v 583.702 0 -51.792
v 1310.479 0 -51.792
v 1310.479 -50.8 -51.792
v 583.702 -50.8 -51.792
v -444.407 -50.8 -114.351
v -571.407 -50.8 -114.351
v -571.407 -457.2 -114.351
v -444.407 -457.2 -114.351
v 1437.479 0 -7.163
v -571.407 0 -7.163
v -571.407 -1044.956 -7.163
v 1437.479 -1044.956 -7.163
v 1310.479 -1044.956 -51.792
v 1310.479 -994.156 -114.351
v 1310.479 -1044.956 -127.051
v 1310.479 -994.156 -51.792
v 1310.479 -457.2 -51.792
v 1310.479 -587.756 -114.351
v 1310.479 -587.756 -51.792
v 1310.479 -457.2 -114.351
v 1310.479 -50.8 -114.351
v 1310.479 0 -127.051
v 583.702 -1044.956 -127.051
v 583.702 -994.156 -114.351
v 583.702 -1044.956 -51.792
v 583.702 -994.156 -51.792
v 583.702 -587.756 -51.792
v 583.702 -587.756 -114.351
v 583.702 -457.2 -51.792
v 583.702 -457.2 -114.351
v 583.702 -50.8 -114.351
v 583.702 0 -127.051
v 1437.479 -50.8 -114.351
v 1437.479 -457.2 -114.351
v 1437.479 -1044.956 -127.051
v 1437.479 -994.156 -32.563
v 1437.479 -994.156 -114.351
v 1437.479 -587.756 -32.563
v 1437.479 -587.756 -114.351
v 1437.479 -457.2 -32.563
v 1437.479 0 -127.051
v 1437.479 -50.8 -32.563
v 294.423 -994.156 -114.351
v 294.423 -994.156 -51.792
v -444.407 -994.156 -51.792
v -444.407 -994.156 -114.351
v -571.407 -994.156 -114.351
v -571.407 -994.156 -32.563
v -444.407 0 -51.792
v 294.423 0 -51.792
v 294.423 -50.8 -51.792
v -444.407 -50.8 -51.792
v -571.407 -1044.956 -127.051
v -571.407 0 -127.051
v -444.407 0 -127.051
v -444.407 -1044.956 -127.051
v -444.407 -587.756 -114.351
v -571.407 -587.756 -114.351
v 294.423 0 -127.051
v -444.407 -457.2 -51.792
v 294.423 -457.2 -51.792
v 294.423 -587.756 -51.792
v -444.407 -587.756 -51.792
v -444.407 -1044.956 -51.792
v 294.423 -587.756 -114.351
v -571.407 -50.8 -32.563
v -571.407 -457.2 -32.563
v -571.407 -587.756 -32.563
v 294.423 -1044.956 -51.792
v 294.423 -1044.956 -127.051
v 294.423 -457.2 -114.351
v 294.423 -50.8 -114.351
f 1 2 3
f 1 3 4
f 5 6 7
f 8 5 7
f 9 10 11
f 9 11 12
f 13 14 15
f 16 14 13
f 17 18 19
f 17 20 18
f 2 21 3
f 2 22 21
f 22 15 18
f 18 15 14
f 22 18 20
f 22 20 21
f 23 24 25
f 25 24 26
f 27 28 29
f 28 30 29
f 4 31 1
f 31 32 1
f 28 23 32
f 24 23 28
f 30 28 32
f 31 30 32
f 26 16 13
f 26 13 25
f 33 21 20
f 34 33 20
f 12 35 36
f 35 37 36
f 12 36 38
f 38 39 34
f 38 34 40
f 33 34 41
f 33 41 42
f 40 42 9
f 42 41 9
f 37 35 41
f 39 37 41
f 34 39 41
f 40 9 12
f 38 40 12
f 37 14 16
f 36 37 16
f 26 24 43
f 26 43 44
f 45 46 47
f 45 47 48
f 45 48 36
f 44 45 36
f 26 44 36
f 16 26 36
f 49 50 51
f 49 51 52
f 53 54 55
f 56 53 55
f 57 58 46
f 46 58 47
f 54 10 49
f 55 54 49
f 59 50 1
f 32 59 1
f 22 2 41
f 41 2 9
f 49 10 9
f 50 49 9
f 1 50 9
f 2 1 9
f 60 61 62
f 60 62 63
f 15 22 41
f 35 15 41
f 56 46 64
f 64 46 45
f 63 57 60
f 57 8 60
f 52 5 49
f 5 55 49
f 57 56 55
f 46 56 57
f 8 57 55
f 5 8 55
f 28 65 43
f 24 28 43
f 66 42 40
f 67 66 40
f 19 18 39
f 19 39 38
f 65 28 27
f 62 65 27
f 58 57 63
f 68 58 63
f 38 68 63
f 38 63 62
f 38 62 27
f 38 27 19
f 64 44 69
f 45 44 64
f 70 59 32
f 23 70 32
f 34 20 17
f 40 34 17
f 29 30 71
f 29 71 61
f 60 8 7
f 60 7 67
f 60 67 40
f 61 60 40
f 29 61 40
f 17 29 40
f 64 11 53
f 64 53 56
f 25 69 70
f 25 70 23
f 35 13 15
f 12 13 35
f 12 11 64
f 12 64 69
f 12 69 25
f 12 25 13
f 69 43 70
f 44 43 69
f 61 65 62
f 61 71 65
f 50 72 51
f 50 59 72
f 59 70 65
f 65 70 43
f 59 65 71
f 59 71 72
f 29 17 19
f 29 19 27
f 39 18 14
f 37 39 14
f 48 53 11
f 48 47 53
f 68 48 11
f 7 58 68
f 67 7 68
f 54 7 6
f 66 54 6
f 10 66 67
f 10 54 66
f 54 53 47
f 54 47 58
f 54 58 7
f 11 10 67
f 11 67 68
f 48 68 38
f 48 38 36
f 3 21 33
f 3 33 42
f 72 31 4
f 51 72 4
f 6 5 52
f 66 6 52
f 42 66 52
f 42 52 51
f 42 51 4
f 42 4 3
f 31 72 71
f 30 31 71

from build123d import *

# Parameters (mm, degrees)
F0_W     = 2008.886
F0_H     = 119.888
F1_DEPTH = 1044.956
F2_W     = 738.8298484659
F2_H     = 75.2589369982
F2_W_2   = 726.7765416155
F3_DEPTH = 1044.956
F4_W     = 406.4
F4_H     = 81.788
F5_DEPTH = 2008.886


with BuildPart() as f1:
    # F0 (on Front) → F1 (new body)
    with BuildSketch(Plane.XZ):
        with Locations((433.0359270411, -67.1071302024)):
            Rectangle(F0_W, F0_H)
    extrude(amount=F1_DEPTH)

    # F2 (on face) → F3 (cut)
    with BuildSketch(Plane(origin=(0, 0, 0), x_dir=(-1, 0, 0), z_dir=(0, 1, 0))):
        with Locations((74.992148726, -89.4216617033)):
            Rectangle(F2_W, F2_H)
        with Locations((-947.0906562333, -89.4216617033)):
            Rectangle(F2_W_2, F2_H)
    extrude(amount=-F3_DEPTH, mode=Mode.SUBTRACT)

    # F4 (on face) → F5 (cut)
    with BuildSketch(Plane(origin=(-571.4070729589, 0, 0), x_dir=(0, -1, 0), z_dir=(-1, 0, 0))):
        with Locations((254, -73.4571302024)):
            Rectangle(F4_W, F4_H)
        with Locations((790.956, -73.4571302024)):
            Rectangle(F4_W, F4_H)
    extrude(amount=-F5_DEPTH, mode=Mode.SUBTRACT)


solid = f1.part
